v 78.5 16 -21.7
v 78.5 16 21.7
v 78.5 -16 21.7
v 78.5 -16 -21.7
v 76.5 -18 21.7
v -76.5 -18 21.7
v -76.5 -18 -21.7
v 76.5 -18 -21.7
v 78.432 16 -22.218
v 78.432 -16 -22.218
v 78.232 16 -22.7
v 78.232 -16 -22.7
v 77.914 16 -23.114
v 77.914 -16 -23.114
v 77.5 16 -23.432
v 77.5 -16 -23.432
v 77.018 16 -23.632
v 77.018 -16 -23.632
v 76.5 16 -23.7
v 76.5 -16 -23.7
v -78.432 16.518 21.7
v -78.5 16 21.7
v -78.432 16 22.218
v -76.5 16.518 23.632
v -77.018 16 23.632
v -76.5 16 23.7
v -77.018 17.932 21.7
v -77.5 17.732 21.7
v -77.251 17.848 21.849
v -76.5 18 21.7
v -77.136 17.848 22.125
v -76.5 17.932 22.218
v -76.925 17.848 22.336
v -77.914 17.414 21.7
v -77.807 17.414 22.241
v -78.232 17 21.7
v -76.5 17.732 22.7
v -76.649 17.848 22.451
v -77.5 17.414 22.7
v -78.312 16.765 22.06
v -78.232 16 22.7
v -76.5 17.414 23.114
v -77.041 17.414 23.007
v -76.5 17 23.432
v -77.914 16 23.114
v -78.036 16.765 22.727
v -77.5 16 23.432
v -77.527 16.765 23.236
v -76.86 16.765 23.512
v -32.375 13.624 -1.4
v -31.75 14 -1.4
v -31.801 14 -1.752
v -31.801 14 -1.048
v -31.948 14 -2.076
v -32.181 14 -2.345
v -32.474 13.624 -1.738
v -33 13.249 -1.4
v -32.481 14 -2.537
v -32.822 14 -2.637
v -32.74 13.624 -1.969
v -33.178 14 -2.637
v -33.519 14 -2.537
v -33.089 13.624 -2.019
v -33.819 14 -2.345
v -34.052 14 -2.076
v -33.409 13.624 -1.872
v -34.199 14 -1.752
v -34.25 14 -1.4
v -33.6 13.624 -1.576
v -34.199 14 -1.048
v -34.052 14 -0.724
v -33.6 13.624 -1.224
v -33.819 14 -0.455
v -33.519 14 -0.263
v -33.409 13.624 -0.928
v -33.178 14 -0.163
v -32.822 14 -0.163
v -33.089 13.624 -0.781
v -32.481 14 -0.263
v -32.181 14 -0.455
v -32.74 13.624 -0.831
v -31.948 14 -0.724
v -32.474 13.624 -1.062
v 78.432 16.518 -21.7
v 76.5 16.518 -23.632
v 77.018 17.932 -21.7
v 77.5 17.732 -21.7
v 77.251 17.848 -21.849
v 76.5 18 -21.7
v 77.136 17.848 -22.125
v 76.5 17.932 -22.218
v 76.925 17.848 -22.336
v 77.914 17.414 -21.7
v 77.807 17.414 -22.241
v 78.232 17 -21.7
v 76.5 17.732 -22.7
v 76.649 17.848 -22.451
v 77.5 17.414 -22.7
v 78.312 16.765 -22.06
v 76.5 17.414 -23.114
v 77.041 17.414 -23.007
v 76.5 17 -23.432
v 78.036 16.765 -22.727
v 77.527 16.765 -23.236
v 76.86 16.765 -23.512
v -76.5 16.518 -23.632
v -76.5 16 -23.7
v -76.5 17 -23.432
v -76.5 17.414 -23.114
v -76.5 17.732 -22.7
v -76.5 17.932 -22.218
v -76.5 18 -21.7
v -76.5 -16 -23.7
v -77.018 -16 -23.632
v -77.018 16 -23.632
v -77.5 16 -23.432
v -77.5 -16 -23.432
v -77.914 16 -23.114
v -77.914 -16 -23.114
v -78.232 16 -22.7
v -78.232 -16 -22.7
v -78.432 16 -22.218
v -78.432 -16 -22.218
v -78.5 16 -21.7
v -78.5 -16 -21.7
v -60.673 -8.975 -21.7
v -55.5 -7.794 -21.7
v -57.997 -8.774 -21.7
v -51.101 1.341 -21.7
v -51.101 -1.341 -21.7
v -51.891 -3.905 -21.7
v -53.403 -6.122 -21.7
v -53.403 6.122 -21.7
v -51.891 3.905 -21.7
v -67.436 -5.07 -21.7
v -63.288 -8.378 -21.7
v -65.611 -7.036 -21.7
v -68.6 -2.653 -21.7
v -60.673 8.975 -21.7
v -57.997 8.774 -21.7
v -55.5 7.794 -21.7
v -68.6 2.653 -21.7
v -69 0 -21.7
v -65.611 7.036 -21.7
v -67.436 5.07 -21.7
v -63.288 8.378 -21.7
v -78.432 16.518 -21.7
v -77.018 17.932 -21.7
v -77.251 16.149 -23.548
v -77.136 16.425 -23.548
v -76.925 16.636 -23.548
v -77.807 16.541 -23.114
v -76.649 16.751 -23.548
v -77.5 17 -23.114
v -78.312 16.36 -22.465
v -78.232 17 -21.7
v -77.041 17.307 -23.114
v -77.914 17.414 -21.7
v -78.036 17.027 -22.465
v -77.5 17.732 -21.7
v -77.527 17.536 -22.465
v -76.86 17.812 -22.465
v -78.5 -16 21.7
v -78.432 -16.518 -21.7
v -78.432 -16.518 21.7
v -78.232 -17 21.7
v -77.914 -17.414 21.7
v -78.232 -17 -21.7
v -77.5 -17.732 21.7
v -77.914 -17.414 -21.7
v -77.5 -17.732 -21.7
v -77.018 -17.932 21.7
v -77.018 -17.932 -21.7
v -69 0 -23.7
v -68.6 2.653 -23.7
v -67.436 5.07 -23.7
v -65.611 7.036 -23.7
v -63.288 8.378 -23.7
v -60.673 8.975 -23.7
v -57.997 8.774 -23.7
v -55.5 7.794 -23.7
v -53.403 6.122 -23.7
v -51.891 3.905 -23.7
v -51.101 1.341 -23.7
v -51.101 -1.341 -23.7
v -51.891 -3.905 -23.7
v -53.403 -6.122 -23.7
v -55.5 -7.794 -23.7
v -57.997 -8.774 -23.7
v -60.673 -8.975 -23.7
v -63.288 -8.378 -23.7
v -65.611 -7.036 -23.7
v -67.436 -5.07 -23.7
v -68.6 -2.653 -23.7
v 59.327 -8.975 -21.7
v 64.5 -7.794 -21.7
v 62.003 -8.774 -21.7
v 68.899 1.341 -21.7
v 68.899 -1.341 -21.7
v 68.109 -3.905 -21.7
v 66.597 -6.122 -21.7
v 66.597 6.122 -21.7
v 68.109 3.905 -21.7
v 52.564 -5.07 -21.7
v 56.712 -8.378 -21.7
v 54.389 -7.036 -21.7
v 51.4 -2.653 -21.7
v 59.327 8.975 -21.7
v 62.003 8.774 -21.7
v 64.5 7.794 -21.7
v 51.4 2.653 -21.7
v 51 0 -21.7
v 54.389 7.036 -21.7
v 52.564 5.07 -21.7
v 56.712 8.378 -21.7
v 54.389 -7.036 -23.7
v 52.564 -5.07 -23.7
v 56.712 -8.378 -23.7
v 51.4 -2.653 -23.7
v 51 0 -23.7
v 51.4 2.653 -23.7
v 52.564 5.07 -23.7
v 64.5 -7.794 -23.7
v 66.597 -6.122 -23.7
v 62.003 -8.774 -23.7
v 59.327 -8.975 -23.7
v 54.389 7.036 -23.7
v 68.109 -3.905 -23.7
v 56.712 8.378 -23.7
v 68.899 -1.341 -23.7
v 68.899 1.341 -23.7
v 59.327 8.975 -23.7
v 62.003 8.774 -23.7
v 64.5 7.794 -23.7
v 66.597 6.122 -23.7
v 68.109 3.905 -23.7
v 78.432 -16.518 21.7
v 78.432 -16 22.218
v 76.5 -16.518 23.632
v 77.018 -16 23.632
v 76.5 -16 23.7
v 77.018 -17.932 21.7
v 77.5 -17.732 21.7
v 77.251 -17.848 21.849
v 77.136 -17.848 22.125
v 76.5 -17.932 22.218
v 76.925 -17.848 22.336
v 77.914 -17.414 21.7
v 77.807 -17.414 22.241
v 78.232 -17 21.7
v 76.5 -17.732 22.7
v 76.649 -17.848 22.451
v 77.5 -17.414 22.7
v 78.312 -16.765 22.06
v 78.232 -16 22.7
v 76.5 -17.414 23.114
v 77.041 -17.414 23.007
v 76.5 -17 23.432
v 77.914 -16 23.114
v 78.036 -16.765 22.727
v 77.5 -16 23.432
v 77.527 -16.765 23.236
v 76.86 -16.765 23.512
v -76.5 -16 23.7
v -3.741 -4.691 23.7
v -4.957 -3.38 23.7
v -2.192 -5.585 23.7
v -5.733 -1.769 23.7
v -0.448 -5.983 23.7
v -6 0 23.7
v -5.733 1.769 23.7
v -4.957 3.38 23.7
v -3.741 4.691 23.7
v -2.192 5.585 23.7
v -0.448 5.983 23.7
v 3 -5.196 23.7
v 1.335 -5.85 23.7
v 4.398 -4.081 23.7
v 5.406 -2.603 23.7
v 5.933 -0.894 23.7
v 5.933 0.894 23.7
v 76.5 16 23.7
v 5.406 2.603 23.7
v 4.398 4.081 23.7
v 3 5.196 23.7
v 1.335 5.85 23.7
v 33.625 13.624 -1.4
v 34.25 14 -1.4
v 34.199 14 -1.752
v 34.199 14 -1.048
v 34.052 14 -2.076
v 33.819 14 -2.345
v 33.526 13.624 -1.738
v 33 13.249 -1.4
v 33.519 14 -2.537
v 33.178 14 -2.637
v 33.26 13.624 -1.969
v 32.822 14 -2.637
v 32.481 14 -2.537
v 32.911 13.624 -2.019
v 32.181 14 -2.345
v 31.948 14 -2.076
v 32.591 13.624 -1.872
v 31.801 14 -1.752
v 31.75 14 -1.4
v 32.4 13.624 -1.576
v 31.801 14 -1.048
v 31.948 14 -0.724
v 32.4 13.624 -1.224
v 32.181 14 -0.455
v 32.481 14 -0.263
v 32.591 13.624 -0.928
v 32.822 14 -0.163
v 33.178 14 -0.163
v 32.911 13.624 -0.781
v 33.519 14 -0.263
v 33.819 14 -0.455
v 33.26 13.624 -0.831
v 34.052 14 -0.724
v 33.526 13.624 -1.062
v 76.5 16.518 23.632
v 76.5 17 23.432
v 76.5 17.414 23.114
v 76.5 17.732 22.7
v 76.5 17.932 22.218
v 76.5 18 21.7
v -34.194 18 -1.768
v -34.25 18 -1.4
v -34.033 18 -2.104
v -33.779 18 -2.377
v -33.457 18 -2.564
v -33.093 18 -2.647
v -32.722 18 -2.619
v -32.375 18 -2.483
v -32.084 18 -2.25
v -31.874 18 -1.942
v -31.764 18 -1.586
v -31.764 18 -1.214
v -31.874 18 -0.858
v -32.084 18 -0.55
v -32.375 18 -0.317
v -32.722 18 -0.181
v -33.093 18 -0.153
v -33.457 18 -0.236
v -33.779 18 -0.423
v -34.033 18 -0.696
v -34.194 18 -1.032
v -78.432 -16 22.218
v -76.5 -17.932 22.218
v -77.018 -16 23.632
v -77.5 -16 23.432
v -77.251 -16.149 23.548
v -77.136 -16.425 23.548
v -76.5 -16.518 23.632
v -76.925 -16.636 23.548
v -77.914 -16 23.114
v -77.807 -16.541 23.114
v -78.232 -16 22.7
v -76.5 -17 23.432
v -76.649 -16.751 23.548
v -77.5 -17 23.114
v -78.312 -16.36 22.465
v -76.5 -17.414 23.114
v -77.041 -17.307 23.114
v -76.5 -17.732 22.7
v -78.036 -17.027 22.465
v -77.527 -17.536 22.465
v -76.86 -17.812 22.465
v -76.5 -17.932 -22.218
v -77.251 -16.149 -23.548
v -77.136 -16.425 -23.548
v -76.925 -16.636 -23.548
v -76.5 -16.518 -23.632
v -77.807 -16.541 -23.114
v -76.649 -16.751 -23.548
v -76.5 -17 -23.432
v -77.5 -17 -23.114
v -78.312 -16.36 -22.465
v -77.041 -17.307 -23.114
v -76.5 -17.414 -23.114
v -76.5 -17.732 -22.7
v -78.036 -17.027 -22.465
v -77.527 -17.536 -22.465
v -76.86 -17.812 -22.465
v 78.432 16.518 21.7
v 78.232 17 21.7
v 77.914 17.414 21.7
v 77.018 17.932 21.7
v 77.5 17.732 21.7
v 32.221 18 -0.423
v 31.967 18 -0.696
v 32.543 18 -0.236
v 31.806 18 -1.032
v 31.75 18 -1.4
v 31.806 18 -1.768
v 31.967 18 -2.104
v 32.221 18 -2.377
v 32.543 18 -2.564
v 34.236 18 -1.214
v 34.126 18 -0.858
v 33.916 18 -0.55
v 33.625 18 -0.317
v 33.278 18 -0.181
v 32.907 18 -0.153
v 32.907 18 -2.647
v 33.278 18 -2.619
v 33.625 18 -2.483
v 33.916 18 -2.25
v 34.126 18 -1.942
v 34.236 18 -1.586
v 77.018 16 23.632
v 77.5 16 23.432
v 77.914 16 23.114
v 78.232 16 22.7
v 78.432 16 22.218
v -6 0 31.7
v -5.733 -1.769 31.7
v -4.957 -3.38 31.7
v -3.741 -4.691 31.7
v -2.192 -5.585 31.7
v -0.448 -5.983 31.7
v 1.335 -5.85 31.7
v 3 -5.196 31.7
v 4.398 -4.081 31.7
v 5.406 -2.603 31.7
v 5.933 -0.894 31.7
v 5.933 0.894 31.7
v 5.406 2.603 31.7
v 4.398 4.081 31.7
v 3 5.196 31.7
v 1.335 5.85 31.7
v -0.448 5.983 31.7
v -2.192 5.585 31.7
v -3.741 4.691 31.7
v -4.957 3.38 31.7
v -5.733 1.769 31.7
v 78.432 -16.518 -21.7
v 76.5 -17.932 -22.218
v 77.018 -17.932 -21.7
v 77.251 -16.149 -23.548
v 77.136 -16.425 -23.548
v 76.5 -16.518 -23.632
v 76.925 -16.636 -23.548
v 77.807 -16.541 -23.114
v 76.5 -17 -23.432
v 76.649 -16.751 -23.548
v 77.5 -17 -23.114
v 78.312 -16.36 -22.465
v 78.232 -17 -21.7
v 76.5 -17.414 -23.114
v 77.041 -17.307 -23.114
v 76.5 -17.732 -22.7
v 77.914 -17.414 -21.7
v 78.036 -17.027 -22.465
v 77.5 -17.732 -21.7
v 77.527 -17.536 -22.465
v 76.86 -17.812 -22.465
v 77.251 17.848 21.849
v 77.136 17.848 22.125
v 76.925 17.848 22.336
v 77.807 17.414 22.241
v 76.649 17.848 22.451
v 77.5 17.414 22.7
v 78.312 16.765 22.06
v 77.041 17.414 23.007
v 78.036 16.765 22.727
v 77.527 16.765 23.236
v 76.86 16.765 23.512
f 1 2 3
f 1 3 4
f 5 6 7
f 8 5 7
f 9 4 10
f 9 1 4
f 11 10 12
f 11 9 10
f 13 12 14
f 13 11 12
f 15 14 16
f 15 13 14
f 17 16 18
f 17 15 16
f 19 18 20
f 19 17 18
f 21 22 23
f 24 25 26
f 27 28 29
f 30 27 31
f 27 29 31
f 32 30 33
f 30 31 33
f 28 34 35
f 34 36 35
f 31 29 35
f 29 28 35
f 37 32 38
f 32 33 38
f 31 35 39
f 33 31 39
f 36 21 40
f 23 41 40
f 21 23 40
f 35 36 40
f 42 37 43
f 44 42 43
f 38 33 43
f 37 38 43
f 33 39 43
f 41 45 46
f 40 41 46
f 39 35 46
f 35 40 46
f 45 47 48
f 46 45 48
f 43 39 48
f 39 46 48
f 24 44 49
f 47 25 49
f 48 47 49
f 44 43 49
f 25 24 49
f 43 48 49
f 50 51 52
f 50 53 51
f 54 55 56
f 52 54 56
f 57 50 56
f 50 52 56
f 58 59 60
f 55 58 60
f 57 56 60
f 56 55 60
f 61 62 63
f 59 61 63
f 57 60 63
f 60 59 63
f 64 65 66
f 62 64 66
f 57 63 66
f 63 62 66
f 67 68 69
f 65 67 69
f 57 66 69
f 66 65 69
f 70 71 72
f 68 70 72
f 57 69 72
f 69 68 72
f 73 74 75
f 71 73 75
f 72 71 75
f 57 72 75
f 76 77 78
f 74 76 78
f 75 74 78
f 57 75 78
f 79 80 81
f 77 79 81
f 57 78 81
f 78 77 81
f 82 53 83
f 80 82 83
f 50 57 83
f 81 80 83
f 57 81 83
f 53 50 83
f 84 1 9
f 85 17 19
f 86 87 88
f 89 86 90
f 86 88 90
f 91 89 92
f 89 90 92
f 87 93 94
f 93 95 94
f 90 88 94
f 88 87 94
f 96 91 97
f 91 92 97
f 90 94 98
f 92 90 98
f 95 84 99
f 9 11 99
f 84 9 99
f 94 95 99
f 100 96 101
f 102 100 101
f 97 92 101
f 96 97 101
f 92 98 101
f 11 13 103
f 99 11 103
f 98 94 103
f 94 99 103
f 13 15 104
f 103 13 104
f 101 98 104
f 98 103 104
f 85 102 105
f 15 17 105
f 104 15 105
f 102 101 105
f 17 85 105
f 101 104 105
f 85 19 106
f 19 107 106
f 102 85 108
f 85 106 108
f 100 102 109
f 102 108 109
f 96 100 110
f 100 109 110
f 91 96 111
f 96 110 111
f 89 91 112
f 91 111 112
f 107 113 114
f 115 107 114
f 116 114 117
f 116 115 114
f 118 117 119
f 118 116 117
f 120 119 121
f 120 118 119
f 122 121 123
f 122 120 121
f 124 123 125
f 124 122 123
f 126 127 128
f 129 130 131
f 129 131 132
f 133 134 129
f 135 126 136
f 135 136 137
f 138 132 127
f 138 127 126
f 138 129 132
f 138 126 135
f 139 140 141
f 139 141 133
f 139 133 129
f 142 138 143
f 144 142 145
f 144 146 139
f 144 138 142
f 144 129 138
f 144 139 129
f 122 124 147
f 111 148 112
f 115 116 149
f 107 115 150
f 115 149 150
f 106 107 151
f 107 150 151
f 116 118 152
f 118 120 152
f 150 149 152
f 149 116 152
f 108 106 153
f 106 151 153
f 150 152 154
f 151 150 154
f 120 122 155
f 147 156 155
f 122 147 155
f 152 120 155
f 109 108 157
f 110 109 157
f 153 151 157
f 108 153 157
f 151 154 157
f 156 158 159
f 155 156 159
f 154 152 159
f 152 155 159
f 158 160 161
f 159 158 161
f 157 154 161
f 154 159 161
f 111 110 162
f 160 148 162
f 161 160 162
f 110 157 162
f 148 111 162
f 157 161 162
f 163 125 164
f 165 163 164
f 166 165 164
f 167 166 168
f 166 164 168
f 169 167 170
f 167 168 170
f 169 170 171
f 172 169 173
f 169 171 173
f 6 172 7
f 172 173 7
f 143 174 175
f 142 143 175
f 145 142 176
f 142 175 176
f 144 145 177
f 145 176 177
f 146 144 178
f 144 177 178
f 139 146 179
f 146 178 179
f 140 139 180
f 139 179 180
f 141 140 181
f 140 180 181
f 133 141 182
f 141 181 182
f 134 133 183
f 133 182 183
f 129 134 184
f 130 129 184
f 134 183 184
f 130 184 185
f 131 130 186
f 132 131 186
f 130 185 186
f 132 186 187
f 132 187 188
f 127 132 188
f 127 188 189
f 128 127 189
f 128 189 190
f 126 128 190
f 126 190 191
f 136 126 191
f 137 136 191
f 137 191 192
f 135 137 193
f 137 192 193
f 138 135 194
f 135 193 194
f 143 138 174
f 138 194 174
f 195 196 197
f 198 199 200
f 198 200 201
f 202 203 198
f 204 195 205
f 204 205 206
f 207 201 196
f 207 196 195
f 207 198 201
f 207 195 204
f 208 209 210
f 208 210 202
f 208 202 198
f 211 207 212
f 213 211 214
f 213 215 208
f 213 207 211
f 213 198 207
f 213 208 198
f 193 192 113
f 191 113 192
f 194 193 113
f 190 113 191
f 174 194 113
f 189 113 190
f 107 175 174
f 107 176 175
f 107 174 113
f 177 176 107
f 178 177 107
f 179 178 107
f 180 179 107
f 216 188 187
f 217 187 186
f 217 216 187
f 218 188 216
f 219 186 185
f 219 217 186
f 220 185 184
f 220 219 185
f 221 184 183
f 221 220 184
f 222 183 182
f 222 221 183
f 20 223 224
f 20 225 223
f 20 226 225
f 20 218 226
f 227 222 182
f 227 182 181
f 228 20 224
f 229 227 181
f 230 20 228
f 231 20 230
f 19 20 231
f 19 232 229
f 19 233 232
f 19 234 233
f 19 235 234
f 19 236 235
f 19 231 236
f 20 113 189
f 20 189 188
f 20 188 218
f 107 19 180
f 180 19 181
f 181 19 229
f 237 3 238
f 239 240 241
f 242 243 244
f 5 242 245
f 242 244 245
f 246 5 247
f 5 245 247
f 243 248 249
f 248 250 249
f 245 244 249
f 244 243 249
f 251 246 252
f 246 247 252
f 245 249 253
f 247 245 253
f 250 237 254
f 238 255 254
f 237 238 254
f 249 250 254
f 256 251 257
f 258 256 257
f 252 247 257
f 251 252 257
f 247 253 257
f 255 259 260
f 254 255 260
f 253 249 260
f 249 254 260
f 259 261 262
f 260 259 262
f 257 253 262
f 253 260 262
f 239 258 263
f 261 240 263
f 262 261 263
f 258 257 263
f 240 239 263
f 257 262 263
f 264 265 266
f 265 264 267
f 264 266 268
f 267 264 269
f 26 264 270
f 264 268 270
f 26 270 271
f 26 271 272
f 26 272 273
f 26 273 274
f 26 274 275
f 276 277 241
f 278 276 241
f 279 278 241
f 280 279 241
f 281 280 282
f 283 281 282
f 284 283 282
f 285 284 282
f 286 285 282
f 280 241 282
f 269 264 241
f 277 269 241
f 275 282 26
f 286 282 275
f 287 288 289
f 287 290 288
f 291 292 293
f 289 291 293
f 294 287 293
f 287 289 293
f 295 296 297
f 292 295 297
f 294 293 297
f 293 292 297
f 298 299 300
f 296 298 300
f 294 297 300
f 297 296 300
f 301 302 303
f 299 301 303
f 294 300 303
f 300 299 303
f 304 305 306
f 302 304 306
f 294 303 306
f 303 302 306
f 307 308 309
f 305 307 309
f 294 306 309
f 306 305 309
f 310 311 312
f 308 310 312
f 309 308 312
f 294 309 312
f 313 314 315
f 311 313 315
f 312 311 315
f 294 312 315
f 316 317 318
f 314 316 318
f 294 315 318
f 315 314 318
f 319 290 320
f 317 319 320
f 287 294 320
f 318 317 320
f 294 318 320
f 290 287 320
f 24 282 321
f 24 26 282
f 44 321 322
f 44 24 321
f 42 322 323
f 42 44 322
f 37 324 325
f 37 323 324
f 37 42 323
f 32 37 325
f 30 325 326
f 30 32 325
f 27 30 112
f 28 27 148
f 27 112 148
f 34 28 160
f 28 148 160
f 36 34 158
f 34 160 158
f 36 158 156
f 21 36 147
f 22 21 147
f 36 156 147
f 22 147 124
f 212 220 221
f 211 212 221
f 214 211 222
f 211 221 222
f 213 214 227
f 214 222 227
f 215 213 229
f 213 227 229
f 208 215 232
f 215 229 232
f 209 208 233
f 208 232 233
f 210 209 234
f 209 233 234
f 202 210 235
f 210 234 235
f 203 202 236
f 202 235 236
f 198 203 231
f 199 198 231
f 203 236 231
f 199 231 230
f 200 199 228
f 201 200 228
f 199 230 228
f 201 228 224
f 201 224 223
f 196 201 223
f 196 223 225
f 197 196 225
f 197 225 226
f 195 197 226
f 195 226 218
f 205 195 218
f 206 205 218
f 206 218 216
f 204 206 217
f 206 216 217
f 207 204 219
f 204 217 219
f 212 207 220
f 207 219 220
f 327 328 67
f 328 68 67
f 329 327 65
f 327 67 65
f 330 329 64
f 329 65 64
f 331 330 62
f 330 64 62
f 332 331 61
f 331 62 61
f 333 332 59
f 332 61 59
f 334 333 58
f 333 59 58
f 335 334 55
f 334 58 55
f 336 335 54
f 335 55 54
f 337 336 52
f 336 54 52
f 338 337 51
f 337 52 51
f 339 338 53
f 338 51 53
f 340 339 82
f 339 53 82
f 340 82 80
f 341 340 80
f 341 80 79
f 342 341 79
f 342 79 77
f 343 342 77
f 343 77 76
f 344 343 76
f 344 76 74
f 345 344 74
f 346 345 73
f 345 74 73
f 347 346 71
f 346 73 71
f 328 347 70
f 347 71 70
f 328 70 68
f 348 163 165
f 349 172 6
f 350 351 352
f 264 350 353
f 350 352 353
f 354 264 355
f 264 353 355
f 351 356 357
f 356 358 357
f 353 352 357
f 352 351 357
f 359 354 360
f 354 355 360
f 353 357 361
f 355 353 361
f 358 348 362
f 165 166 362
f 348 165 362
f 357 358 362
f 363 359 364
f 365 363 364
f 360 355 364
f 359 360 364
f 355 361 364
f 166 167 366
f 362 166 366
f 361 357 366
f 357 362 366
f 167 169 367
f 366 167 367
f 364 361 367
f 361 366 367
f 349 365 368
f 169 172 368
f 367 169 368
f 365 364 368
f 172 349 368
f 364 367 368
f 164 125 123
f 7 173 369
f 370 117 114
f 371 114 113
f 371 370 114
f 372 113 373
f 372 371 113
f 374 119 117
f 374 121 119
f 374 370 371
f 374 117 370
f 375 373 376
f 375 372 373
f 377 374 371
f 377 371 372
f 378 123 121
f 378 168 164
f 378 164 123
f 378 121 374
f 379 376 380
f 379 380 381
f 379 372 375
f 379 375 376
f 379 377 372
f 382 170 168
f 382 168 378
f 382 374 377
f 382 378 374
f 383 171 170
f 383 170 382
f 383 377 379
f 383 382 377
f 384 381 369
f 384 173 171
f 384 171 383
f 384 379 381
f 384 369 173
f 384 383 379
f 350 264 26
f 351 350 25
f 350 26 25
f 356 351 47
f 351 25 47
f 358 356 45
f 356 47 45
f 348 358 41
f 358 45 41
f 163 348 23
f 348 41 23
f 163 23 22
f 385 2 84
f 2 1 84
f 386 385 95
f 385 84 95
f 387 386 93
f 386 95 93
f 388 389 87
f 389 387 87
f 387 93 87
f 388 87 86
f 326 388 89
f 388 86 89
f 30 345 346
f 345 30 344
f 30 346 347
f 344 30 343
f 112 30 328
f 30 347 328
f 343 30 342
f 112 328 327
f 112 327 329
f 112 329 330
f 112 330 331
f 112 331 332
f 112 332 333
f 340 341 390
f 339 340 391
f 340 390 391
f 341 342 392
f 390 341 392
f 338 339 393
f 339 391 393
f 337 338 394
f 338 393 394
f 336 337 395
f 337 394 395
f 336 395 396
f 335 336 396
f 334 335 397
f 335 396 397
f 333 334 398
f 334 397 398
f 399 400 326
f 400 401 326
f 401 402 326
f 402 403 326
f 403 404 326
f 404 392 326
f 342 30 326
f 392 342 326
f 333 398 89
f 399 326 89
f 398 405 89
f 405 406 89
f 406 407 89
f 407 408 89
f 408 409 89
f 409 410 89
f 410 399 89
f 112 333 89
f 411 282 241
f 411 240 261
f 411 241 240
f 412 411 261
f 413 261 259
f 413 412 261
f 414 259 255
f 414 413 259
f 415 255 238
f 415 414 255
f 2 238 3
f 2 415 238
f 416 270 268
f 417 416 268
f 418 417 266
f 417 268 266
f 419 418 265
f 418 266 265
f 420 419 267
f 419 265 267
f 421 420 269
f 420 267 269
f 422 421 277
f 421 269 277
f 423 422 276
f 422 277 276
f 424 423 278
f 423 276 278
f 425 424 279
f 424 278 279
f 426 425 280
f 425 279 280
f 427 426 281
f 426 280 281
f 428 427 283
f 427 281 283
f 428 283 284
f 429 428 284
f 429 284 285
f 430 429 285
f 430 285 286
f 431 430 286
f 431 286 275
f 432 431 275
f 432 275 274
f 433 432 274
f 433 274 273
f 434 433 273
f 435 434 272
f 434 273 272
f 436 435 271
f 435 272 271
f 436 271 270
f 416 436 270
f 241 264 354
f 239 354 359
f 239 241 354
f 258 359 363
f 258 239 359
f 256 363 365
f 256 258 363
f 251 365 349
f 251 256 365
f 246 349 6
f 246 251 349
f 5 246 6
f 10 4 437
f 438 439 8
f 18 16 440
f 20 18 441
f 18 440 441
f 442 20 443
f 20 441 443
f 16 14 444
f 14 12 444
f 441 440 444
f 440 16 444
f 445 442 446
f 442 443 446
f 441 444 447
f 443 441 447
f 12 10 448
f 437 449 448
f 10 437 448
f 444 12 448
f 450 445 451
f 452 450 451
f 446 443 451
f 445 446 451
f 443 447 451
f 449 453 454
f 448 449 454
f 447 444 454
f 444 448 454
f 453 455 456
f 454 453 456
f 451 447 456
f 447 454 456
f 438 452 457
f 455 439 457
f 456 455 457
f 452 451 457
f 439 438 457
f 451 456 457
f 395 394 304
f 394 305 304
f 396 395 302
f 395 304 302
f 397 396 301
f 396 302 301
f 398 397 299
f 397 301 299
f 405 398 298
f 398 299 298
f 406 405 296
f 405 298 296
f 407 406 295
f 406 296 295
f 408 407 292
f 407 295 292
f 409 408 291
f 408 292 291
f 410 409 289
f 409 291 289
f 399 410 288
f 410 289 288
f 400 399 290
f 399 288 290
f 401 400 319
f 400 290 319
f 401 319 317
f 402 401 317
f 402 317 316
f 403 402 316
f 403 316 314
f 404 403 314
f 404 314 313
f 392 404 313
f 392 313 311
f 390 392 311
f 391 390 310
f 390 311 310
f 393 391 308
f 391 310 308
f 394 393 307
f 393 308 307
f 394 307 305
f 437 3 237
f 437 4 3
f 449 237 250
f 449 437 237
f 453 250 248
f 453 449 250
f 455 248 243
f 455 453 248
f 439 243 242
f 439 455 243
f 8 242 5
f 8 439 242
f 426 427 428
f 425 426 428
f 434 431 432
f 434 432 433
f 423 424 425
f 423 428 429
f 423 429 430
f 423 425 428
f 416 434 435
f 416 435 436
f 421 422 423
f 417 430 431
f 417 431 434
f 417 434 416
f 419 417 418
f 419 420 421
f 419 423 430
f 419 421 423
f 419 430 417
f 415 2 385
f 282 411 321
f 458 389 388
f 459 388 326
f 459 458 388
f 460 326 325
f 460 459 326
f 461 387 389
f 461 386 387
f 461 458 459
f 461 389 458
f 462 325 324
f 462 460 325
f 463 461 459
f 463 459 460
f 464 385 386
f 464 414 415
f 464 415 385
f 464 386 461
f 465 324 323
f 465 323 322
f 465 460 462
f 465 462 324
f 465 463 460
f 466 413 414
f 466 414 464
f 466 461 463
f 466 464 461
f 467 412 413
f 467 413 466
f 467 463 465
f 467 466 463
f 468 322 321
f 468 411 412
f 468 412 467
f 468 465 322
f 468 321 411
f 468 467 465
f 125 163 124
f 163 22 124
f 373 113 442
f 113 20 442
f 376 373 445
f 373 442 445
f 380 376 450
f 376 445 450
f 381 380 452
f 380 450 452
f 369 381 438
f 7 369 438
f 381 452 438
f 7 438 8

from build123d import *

# Parameters (mm, degrees)
SKETCH_1_W             = 47.4
SKETCH_1_H             = 36
EXTRUDE_1_DEPTH        = 78.5
FILLET_1_R             = 2
HOLE_WIZARD_M3_1_D     = 2.5
HOLE_WIZARD_M3_1_DEPTH = 4
HOLE_WIZARD_M3_1_TIP   = 0.751075774
SKETCH_4_R             = 9
CUT_EXTRUDE_1_DEPTH    = 2
SKETCH_5_R             = 6
EXTRUDE_2_DEPTH        = 8


with BuildPart() as part:
    # 草图1 → 凸台-拉伸1 (new, symmetric)
    with BuildSketch(Plane(origin=(0, 0, 0), x_dir=(0, 0, -1), z_dir=(1, 0, 0))):
        Rectangle(SKETCH_1_W, SKETCH_1_H)
    extrude(amount=EXTRUDE_1_DEPTH, both=True)

    # 圆角1
    fillet_1_edges = [part.edges().sort_by_distance(p)[0] for p in [
        (78.5, 0, 23.7),
        (78.5, -18, 0),
        (78.5, 0, -23.7),
        (-78.5, -18, 0),
        (-78.5, 0, 23.7),
        (-78.5, 18, 0),
        (-78.5, 0, -23.7),
        (78.5, 18, 0),
        (0, -18, -23.7),
        (0, -18, 23.7),
        (0, 18, 23.7),
        (0, 18, -23.7),
    ]]
    fillet(fillet_1_edges, radius=FILLET_1_R)

    # M3 螺纹孔1
    with Locations(Plane(origin=(0, 18, 41.7), x_dir=(1, 0, 0), z_dir=(0, 1, 0))):
        with Locations((-33, 43.1), (33, 43.1)):
            Hole(HOLE_WIZARD_M3_1_D / 2, depth=HOLE_WIZARD_M3_1_DEPTH)
            with Locations((0, 0, -(HOLE_WIZARD_M3_1_DEPTH + HOLE_WIZARD_M3_1_TIP / 2))):  # 118° drill point
                Cone(0, HOLE_WIZARD_M3_1_D / 2, HOLE_WIZARD_M3_1_TIP, mode=Mode.SUBTRACT)

    # 草图4 → 切除-拉伸1 (cut)
    with BuildSketch(Plane(origin=(0, 0, -23.7), x_dir=(-1, 0, 0), z_dir=(0, 0, -1))):
        with Locations((60, 0)):
            Circle(SKETCH_4_R)
        with Locations((-60, 0)):
            Circle(SKETCH_4_R)
    extrude(amount=-CUT_EXTRUDE_1_DEPTH, mode=Mode.SUBTRACT)

    # 草图5 → 凸台-拉伸2 (add)
    with BuildSketch(Plane.XY.offset(23.7)):
        with Locations(Location((0, 0, 0), (0, 0, 180))):
            Circle(SKETCH_5_R)
    extrude(amount=EXTRUDE_2_DEPTH)


solid = part.part
